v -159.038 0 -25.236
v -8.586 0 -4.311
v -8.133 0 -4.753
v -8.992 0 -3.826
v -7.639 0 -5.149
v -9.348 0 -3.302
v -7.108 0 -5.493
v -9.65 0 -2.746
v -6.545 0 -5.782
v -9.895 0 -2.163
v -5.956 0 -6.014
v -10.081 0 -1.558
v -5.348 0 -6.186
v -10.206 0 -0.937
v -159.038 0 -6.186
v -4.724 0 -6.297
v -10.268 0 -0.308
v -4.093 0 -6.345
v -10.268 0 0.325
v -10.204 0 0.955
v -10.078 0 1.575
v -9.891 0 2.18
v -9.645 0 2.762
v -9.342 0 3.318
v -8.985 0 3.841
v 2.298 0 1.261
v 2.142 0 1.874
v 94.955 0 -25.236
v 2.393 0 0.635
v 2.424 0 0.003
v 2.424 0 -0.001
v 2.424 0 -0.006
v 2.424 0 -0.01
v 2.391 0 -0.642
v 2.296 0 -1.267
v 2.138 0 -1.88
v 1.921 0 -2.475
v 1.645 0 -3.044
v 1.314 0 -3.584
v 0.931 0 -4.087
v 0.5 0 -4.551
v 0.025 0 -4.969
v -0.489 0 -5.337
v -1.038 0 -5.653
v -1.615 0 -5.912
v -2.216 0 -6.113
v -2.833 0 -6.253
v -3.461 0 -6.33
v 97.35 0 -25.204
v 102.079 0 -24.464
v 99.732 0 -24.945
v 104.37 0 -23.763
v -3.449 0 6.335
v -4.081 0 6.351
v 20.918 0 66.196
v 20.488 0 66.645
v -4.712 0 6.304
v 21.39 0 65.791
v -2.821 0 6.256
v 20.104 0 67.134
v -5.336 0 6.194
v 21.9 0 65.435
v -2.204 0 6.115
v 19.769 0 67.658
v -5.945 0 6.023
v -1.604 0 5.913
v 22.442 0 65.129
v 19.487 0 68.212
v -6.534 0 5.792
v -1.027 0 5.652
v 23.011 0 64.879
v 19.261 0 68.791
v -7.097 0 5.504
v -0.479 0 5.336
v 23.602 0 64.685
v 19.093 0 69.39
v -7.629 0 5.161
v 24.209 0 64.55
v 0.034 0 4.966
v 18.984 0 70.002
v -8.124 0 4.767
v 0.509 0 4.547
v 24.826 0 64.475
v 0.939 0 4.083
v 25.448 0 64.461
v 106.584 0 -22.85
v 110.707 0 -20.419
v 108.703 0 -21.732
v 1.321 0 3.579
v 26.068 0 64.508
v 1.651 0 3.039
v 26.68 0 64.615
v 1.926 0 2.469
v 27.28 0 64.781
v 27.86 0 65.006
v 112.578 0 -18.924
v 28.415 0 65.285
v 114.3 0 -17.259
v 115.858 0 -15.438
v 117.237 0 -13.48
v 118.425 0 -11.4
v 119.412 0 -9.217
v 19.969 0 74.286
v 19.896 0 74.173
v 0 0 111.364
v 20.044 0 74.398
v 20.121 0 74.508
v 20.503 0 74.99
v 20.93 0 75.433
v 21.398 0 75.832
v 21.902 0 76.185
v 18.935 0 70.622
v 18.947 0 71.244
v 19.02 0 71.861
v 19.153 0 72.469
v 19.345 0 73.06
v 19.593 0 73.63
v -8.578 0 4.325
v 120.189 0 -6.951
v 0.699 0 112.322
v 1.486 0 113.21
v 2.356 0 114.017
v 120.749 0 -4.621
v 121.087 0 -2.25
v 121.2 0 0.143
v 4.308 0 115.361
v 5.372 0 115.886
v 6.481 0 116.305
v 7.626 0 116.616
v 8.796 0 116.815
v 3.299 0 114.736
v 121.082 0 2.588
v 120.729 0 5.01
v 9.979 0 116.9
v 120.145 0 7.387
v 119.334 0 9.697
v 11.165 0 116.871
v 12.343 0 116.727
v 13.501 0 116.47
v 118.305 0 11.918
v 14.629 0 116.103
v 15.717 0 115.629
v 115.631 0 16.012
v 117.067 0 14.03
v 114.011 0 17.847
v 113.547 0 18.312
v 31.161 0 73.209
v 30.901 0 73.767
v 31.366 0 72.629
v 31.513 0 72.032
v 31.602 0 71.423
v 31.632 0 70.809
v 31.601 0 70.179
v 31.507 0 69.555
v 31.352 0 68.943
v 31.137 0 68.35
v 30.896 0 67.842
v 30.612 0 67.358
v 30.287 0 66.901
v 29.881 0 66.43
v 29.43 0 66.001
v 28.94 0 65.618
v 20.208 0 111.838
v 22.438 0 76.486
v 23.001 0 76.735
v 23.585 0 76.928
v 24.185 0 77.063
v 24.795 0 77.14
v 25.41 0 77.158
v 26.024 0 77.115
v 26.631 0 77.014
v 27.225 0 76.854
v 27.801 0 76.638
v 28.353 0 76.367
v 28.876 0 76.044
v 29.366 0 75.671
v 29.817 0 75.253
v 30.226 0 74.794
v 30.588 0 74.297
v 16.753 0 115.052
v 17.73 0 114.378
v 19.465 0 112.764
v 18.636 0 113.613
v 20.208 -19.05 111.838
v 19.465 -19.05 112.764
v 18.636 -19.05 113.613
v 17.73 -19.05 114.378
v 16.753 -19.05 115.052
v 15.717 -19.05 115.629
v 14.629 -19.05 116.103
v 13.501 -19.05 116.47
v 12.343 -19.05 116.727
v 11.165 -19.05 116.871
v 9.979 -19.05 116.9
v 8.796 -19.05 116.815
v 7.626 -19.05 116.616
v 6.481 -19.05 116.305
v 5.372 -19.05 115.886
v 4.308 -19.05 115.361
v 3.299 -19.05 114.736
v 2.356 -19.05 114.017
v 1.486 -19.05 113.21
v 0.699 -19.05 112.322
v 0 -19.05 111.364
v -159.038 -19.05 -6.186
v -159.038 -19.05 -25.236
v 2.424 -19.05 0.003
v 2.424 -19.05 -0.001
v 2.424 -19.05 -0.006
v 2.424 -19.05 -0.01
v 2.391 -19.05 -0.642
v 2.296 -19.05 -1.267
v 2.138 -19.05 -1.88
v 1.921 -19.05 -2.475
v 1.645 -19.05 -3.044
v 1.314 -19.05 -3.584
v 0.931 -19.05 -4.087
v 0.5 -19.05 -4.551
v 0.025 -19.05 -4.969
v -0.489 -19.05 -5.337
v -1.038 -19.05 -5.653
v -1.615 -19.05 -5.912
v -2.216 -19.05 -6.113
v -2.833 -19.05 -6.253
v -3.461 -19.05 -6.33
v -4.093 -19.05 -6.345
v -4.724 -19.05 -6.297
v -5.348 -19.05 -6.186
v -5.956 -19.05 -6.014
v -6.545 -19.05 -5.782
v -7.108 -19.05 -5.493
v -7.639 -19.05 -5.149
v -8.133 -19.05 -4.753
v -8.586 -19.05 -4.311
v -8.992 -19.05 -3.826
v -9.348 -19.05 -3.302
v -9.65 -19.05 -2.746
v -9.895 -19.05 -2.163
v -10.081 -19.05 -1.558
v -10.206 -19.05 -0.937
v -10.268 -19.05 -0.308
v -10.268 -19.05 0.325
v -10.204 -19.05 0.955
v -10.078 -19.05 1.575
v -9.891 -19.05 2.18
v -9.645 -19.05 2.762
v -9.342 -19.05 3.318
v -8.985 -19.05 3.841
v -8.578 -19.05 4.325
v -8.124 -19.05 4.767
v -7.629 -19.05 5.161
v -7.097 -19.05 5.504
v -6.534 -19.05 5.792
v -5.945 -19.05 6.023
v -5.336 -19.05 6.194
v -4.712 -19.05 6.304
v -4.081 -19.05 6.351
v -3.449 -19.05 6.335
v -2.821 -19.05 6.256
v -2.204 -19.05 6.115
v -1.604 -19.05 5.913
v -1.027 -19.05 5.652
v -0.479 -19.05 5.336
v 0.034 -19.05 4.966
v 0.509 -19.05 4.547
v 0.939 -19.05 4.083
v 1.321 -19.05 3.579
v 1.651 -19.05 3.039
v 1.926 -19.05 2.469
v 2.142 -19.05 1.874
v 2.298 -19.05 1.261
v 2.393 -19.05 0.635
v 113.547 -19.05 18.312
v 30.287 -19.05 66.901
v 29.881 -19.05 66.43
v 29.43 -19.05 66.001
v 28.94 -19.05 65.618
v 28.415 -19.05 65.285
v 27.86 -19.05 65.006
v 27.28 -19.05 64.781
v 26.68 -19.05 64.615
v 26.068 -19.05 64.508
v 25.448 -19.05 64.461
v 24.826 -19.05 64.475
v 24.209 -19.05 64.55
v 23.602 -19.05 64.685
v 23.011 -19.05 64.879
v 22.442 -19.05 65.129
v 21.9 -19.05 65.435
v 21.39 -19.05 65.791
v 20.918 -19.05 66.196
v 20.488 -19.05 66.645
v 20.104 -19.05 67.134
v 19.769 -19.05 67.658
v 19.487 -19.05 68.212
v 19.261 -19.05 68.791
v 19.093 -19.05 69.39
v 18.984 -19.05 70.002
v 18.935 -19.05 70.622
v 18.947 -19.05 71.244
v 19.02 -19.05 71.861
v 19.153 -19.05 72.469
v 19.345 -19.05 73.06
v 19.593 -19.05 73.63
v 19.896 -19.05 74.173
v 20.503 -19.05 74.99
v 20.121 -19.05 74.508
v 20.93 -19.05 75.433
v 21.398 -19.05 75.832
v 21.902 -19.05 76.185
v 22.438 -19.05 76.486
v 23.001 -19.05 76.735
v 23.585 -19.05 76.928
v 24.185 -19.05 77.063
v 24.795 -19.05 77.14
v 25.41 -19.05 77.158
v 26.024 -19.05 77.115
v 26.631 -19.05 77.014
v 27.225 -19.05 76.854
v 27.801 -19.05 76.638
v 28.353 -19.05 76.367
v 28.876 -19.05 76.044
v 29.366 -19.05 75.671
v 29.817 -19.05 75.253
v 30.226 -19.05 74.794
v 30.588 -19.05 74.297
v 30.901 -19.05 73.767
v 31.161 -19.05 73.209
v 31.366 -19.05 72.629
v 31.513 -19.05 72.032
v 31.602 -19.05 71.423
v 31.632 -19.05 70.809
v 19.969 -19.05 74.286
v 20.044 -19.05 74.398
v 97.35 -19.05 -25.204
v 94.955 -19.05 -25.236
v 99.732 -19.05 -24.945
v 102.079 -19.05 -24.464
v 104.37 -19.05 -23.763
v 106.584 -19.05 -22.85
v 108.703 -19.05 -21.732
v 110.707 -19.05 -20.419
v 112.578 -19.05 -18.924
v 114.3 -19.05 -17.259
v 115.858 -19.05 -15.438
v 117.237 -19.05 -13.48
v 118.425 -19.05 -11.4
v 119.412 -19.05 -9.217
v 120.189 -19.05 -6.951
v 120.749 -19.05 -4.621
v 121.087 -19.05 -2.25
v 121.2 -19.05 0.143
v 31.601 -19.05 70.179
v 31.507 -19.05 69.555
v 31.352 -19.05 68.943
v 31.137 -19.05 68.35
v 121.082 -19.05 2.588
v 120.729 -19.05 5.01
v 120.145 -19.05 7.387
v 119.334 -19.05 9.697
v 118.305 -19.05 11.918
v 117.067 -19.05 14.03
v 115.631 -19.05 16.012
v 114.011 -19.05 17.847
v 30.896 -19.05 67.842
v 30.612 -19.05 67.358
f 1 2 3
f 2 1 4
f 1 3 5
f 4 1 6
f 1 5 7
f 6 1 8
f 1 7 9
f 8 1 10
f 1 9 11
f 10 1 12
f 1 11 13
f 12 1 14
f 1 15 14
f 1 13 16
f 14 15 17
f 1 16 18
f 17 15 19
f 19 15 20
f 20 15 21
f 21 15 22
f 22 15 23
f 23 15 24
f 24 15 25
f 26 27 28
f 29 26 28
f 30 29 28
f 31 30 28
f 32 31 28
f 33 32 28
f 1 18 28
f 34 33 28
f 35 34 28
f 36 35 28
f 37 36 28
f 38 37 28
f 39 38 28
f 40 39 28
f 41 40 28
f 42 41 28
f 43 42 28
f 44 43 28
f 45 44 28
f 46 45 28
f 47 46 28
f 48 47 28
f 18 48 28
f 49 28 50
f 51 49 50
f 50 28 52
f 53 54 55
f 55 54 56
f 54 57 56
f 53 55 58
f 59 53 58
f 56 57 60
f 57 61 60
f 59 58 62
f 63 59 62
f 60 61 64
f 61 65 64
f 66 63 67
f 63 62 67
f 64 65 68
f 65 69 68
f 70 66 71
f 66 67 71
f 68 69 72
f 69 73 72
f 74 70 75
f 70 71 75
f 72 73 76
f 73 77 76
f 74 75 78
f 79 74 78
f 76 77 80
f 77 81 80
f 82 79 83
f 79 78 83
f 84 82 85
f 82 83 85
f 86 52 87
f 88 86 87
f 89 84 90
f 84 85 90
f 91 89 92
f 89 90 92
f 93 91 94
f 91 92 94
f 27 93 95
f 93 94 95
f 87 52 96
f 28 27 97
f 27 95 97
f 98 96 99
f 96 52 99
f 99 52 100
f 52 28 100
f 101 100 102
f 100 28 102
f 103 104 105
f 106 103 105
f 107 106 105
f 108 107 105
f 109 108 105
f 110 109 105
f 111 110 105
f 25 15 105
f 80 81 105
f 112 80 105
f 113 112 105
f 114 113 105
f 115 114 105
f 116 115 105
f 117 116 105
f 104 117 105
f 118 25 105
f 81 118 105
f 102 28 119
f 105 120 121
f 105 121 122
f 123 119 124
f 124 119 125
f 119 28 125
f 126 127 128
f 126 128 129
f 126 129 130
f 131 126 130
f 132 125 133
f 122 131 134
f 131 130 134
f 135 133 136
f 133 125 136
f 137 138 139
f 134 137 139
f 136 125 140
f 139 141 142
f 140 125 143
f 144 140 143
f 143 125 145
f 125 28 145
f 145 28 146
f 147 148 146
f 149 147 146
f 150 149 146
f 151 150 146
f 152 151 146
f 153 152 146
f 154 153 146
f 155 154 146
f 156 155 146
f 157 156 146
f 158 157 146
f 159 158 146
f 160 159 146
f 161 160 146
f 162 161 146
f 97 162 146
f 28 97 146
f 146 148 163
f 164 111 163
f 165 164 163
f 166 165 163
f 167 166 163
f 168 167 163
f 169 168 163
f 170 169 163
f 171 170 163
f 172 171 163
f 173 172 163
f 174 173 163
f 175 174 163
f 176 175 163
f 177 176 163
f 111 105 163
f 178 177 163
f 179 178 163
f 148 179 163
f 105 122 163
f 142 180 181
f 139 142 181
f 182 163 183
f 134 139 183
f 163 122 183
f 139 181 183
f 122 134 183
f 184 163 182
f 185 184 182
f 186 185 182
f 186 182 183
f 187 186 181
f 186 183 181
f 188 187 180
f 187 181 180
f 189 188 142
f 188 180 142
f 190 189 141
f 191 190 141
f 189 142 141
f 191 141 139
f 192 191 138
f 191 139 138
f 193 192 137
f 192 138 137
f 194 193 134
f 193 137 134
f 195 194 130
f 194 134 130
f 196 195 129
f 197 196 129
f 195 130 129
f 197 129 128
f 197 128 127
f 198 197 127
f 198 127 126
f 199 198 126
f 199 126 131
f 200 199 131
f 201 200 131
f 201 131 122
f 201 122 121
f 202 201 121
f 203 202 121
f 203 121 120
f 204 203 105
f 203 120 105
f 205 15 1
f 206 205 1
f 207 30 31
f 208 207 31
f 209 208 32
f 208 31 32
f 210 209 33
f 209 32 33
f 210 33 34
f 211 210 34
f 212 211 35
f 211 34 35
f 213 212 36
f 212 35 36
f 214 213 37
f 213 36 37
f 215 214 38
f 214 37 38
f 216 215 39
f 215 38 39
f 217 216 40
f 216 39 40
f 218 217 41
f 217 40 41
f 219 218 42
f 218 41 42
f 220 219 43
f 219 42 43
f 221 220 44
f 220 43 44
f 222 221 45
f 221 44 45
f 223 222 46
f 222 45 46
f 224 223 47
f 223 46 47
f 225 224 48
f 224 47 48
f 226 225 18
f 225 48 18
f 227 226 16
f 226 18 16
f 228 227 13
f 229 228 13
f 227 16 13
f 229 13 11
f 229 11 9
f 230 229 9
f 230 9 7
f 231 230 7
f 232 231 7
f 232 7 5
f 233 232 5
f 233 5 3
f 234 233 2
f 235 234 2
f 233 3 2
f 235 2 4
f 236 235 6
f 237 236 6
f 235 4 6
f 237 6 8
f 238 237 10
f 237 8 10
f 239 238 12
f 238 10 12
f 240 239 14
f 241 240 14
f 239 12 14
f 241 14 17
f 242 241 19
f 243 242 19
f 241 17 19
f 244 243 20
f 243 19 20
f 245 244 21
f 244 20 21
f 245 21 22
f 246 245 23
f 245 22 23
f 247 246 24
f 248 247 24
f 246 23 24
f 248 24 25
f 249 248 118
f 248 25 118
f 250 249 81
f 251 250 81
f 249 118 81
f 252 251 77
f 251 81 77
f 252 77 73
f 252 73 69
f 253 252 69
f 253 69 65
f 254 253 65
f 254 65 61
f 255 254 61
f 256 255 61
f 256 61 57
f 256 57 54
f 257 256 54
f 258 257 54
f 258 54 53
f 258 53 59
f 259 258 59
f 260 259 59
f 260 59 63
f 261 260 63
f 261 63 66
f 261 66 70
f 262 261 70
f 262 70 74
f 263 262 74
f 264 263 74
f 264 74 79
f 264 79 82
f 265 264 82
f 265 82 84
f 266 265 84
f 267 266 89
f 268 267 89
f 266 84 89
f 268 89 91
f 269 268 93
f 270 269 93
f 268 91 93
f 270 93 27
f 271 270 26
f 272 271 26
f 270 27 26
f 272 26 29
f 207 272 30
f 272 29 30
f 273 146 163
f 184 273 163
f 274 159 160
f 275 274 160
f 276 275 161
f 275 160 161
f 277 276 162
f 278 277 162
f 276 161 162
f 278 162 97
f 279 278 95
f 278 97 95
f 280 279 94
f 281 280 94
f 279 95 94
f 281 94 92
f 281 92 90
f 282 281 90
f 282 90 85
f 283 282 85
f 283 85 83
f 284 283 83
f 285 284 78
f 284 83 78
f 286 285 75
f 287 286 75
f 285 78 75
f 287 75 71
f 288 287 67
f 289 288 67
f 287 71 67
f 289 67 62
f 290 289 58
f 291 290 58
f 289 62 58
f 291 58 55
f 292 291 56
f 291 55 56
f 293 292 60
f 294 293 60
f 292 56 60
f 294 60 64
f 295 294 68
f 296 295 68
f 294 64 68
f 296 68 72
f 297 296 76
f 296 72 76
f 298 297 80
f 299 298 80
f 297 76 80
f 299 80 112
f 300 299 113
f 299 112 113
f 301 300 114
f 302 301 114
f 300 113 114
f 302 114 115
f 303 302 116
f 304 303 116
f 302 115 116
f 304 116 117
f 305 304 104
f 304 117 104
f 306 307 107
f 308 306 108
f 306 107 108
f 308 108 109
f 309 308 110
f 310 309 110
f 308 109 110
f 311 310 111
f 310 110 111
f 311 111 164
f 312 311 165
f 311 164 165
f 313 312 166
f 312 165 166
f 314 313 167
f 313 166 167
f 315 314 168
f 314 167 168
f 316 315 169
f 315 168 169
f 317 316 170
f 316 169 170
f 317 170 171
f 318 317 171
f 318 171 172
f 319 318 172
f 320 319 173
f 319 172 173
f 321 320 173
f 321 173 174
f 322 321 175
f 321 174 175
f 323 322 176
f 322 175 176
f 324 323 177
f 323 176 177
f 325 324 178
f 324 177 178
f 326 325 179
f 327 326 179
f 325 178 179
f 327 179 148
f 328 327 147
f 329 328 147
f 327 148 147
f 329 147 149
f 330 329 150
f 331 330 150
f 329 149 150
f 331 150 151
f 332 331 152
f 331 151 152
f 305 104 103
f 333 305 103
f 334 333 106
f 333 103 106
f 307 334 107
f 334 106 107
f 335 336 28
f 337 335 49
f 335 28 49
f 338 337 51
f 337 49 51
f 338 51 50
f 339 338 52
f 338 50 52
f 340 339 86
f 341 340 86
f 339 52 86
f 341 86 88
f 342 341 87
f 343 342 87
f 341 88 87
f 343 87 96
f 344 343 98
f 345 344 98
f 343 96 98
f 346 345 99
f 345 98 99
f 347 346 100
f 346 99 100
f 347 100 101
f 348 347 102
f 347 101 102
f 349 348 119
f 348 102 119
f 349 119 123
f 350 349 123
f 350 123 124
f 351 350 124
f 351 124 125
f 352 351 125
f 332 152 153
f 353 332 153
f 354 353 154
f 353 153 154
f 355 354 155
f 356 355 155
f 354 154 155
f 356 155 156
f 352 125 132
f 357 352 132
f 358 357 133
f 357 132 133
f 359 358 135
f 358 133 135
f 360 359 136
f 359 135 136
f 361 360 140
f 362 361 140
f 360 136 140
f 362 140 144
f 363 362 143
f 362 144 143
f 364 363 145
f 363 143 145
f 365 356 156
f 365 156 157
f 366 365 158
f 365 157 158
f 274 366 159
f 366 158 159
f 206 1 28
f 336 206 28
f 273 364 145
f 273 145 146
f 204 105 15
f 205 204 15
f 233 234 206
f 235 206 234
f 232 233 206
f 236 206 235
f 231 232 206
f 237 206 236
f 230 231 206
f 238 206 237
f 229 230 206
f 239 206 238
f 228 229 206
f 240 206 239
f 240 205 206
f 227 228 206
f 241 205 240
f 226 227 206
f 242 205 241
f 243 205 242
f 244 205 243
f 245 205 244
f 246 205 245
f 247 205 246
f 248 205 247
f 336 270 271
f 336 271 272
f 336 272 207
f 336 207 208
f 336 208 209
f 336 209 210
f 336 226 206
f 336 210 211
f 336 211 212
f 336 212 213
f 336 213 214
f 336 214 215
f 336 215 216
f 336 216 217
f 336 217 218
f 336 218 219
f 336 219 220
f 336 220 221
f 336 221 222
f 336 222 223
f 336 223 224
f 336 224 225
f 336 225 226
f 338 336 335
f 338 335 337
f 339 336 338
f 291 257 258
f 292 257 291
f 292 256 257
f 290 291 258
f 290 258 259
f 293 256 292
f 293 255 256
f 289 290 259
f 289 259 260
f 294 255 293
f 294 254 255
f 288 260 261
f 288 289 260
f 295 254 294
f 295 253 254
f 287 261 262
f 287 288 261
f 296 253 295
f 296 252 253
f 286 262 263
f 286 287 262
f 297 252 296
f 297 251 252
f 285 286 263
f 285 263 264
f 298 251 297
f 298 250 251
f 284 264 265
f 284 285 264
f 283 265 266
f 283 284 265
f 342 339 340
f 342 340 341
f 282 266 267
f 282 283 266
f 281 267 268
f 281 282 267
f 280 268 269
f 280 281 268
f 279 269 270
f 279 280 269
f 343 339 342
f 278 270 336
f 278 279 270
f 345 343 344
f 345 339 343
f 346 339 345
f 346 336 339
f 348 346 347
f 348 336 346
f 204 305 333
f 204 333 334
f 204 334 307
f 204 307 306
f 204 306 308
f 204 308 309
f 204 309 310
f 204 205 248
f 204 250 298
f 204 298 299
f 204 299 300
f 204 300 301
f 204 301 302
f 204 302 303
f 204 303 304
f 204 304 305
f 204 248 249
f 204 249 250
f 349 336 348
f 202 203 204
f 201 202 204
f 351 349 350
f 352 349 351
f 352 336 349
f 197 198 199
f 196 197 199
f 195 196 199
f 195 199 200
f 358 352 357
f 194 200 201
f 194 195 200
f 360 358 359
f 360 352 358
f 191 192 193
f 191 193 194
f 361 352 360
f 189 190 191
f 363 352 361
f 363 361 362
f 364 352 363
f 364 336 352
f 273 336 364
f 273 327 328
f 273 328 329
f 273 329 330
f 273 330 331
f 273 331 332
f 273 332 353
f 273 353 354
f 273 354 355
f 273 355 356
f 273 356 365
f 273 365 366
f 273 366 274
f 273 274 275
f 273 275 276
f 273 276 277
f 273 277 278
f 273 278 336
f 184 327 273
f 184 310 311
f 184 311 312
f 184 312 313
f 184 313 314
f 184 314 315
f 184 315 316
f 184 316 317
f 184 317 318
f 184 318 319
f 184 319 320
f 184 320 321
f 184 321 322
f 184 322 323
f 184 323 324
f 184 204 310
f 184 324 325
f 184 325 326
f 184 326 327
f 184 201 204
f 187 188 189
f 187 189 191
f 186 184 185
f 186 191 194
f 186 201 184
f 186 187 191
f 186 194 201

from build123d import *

# Parameters (mm, degrees)
F1_DEPTH = 19.05


with BuildPart() as f1:
    # F0 (on Front) → F1 (new body)
    with BuildSketch(Plane.XZ):
        with BuildLine():
            Line((113.547035, 18.312154), (20.207565, 111.83846))
            ThreePointArc((20.207565, 111.83846), (21.952168, 108.413993), (22.553312, 104.618043))
            ThreePointArc((22.553312, 104.618043), (6.747525, 92.847809), (0, 111.363538))
            Line((0, 111.363538), (-159.037881, -6.186257))
            Line((-159.037881, -6.186257), (-159.037881, -25.236257))
            Line((-159.037881, -25.236257), (94.955072, -25.236257))
            ThreePointArc((94.955072, -25.236257), (72.452371, 10.113642), (113.547035, 18.312154))
        make_face()
        with BuildLine():
            ThreePointArc((2.424053, 0.002768), (2.42405, -0.003481), (2.424041, -0.00973))
            ThreePointArc((2.424041, -0.00973), (-10.275944, 0.009017), (2.424053, 0.002768))
        make_face(mode=Mode.SUBTRACT)
        with BuildLine():
            ThreePointArc((20.120882, 74.508201), (27.224866, 76.854369), (31.632038, 70.808881))
            ThreePointArc((31.632038, 70.808881), (31.506941, 69.554654), (31.136578, 68.349845))
            ThreePointArc((31.136578, 68.349845), (30.759822, 67.596968), (30.286779, 66.900549))
            ThreePointArc((30.286779, 66.900549), (21.64081, 65.606578), (19.896414, 74.173038))
            ThreePointArc((19.896414, 74.173038), (20.005986, 74.342402), (20.120882, 74.508201))
        make_face(mode=Mode.SUBTRACT)
        with BuildLine():
            Line((114.011193, 17.847066), (113.547035, 18.312154))
            ThreePointArc((113.547035, 18.312154), (72.452371, 10.113642), (94.955072, -25.236257))
            ThreePointArc((94.955072, -25.236257), (113.459019, -18.111528), (121.200292, 0.143075))
            ThreePointArc((121.200292, 0.143075), (119.334471, 9.697059), (114.011193, 17.847066))
        make_face()
        with BuildLine():
            ThreePointArc((22.553312, 104.618043), (21.952168, 108.413993), (20.207565, 111.83846))
            ThreePointArc((20.207565, 111.83846), (9.979243, 116.900066), (0, 111.363538))
            ThreePointArc((0, 111.363538), (6.747525, 92.847809), (22.553312, 104.618043))
        make_face()
    extrude(amount=F1_DEPTH)


solid = f1.part
